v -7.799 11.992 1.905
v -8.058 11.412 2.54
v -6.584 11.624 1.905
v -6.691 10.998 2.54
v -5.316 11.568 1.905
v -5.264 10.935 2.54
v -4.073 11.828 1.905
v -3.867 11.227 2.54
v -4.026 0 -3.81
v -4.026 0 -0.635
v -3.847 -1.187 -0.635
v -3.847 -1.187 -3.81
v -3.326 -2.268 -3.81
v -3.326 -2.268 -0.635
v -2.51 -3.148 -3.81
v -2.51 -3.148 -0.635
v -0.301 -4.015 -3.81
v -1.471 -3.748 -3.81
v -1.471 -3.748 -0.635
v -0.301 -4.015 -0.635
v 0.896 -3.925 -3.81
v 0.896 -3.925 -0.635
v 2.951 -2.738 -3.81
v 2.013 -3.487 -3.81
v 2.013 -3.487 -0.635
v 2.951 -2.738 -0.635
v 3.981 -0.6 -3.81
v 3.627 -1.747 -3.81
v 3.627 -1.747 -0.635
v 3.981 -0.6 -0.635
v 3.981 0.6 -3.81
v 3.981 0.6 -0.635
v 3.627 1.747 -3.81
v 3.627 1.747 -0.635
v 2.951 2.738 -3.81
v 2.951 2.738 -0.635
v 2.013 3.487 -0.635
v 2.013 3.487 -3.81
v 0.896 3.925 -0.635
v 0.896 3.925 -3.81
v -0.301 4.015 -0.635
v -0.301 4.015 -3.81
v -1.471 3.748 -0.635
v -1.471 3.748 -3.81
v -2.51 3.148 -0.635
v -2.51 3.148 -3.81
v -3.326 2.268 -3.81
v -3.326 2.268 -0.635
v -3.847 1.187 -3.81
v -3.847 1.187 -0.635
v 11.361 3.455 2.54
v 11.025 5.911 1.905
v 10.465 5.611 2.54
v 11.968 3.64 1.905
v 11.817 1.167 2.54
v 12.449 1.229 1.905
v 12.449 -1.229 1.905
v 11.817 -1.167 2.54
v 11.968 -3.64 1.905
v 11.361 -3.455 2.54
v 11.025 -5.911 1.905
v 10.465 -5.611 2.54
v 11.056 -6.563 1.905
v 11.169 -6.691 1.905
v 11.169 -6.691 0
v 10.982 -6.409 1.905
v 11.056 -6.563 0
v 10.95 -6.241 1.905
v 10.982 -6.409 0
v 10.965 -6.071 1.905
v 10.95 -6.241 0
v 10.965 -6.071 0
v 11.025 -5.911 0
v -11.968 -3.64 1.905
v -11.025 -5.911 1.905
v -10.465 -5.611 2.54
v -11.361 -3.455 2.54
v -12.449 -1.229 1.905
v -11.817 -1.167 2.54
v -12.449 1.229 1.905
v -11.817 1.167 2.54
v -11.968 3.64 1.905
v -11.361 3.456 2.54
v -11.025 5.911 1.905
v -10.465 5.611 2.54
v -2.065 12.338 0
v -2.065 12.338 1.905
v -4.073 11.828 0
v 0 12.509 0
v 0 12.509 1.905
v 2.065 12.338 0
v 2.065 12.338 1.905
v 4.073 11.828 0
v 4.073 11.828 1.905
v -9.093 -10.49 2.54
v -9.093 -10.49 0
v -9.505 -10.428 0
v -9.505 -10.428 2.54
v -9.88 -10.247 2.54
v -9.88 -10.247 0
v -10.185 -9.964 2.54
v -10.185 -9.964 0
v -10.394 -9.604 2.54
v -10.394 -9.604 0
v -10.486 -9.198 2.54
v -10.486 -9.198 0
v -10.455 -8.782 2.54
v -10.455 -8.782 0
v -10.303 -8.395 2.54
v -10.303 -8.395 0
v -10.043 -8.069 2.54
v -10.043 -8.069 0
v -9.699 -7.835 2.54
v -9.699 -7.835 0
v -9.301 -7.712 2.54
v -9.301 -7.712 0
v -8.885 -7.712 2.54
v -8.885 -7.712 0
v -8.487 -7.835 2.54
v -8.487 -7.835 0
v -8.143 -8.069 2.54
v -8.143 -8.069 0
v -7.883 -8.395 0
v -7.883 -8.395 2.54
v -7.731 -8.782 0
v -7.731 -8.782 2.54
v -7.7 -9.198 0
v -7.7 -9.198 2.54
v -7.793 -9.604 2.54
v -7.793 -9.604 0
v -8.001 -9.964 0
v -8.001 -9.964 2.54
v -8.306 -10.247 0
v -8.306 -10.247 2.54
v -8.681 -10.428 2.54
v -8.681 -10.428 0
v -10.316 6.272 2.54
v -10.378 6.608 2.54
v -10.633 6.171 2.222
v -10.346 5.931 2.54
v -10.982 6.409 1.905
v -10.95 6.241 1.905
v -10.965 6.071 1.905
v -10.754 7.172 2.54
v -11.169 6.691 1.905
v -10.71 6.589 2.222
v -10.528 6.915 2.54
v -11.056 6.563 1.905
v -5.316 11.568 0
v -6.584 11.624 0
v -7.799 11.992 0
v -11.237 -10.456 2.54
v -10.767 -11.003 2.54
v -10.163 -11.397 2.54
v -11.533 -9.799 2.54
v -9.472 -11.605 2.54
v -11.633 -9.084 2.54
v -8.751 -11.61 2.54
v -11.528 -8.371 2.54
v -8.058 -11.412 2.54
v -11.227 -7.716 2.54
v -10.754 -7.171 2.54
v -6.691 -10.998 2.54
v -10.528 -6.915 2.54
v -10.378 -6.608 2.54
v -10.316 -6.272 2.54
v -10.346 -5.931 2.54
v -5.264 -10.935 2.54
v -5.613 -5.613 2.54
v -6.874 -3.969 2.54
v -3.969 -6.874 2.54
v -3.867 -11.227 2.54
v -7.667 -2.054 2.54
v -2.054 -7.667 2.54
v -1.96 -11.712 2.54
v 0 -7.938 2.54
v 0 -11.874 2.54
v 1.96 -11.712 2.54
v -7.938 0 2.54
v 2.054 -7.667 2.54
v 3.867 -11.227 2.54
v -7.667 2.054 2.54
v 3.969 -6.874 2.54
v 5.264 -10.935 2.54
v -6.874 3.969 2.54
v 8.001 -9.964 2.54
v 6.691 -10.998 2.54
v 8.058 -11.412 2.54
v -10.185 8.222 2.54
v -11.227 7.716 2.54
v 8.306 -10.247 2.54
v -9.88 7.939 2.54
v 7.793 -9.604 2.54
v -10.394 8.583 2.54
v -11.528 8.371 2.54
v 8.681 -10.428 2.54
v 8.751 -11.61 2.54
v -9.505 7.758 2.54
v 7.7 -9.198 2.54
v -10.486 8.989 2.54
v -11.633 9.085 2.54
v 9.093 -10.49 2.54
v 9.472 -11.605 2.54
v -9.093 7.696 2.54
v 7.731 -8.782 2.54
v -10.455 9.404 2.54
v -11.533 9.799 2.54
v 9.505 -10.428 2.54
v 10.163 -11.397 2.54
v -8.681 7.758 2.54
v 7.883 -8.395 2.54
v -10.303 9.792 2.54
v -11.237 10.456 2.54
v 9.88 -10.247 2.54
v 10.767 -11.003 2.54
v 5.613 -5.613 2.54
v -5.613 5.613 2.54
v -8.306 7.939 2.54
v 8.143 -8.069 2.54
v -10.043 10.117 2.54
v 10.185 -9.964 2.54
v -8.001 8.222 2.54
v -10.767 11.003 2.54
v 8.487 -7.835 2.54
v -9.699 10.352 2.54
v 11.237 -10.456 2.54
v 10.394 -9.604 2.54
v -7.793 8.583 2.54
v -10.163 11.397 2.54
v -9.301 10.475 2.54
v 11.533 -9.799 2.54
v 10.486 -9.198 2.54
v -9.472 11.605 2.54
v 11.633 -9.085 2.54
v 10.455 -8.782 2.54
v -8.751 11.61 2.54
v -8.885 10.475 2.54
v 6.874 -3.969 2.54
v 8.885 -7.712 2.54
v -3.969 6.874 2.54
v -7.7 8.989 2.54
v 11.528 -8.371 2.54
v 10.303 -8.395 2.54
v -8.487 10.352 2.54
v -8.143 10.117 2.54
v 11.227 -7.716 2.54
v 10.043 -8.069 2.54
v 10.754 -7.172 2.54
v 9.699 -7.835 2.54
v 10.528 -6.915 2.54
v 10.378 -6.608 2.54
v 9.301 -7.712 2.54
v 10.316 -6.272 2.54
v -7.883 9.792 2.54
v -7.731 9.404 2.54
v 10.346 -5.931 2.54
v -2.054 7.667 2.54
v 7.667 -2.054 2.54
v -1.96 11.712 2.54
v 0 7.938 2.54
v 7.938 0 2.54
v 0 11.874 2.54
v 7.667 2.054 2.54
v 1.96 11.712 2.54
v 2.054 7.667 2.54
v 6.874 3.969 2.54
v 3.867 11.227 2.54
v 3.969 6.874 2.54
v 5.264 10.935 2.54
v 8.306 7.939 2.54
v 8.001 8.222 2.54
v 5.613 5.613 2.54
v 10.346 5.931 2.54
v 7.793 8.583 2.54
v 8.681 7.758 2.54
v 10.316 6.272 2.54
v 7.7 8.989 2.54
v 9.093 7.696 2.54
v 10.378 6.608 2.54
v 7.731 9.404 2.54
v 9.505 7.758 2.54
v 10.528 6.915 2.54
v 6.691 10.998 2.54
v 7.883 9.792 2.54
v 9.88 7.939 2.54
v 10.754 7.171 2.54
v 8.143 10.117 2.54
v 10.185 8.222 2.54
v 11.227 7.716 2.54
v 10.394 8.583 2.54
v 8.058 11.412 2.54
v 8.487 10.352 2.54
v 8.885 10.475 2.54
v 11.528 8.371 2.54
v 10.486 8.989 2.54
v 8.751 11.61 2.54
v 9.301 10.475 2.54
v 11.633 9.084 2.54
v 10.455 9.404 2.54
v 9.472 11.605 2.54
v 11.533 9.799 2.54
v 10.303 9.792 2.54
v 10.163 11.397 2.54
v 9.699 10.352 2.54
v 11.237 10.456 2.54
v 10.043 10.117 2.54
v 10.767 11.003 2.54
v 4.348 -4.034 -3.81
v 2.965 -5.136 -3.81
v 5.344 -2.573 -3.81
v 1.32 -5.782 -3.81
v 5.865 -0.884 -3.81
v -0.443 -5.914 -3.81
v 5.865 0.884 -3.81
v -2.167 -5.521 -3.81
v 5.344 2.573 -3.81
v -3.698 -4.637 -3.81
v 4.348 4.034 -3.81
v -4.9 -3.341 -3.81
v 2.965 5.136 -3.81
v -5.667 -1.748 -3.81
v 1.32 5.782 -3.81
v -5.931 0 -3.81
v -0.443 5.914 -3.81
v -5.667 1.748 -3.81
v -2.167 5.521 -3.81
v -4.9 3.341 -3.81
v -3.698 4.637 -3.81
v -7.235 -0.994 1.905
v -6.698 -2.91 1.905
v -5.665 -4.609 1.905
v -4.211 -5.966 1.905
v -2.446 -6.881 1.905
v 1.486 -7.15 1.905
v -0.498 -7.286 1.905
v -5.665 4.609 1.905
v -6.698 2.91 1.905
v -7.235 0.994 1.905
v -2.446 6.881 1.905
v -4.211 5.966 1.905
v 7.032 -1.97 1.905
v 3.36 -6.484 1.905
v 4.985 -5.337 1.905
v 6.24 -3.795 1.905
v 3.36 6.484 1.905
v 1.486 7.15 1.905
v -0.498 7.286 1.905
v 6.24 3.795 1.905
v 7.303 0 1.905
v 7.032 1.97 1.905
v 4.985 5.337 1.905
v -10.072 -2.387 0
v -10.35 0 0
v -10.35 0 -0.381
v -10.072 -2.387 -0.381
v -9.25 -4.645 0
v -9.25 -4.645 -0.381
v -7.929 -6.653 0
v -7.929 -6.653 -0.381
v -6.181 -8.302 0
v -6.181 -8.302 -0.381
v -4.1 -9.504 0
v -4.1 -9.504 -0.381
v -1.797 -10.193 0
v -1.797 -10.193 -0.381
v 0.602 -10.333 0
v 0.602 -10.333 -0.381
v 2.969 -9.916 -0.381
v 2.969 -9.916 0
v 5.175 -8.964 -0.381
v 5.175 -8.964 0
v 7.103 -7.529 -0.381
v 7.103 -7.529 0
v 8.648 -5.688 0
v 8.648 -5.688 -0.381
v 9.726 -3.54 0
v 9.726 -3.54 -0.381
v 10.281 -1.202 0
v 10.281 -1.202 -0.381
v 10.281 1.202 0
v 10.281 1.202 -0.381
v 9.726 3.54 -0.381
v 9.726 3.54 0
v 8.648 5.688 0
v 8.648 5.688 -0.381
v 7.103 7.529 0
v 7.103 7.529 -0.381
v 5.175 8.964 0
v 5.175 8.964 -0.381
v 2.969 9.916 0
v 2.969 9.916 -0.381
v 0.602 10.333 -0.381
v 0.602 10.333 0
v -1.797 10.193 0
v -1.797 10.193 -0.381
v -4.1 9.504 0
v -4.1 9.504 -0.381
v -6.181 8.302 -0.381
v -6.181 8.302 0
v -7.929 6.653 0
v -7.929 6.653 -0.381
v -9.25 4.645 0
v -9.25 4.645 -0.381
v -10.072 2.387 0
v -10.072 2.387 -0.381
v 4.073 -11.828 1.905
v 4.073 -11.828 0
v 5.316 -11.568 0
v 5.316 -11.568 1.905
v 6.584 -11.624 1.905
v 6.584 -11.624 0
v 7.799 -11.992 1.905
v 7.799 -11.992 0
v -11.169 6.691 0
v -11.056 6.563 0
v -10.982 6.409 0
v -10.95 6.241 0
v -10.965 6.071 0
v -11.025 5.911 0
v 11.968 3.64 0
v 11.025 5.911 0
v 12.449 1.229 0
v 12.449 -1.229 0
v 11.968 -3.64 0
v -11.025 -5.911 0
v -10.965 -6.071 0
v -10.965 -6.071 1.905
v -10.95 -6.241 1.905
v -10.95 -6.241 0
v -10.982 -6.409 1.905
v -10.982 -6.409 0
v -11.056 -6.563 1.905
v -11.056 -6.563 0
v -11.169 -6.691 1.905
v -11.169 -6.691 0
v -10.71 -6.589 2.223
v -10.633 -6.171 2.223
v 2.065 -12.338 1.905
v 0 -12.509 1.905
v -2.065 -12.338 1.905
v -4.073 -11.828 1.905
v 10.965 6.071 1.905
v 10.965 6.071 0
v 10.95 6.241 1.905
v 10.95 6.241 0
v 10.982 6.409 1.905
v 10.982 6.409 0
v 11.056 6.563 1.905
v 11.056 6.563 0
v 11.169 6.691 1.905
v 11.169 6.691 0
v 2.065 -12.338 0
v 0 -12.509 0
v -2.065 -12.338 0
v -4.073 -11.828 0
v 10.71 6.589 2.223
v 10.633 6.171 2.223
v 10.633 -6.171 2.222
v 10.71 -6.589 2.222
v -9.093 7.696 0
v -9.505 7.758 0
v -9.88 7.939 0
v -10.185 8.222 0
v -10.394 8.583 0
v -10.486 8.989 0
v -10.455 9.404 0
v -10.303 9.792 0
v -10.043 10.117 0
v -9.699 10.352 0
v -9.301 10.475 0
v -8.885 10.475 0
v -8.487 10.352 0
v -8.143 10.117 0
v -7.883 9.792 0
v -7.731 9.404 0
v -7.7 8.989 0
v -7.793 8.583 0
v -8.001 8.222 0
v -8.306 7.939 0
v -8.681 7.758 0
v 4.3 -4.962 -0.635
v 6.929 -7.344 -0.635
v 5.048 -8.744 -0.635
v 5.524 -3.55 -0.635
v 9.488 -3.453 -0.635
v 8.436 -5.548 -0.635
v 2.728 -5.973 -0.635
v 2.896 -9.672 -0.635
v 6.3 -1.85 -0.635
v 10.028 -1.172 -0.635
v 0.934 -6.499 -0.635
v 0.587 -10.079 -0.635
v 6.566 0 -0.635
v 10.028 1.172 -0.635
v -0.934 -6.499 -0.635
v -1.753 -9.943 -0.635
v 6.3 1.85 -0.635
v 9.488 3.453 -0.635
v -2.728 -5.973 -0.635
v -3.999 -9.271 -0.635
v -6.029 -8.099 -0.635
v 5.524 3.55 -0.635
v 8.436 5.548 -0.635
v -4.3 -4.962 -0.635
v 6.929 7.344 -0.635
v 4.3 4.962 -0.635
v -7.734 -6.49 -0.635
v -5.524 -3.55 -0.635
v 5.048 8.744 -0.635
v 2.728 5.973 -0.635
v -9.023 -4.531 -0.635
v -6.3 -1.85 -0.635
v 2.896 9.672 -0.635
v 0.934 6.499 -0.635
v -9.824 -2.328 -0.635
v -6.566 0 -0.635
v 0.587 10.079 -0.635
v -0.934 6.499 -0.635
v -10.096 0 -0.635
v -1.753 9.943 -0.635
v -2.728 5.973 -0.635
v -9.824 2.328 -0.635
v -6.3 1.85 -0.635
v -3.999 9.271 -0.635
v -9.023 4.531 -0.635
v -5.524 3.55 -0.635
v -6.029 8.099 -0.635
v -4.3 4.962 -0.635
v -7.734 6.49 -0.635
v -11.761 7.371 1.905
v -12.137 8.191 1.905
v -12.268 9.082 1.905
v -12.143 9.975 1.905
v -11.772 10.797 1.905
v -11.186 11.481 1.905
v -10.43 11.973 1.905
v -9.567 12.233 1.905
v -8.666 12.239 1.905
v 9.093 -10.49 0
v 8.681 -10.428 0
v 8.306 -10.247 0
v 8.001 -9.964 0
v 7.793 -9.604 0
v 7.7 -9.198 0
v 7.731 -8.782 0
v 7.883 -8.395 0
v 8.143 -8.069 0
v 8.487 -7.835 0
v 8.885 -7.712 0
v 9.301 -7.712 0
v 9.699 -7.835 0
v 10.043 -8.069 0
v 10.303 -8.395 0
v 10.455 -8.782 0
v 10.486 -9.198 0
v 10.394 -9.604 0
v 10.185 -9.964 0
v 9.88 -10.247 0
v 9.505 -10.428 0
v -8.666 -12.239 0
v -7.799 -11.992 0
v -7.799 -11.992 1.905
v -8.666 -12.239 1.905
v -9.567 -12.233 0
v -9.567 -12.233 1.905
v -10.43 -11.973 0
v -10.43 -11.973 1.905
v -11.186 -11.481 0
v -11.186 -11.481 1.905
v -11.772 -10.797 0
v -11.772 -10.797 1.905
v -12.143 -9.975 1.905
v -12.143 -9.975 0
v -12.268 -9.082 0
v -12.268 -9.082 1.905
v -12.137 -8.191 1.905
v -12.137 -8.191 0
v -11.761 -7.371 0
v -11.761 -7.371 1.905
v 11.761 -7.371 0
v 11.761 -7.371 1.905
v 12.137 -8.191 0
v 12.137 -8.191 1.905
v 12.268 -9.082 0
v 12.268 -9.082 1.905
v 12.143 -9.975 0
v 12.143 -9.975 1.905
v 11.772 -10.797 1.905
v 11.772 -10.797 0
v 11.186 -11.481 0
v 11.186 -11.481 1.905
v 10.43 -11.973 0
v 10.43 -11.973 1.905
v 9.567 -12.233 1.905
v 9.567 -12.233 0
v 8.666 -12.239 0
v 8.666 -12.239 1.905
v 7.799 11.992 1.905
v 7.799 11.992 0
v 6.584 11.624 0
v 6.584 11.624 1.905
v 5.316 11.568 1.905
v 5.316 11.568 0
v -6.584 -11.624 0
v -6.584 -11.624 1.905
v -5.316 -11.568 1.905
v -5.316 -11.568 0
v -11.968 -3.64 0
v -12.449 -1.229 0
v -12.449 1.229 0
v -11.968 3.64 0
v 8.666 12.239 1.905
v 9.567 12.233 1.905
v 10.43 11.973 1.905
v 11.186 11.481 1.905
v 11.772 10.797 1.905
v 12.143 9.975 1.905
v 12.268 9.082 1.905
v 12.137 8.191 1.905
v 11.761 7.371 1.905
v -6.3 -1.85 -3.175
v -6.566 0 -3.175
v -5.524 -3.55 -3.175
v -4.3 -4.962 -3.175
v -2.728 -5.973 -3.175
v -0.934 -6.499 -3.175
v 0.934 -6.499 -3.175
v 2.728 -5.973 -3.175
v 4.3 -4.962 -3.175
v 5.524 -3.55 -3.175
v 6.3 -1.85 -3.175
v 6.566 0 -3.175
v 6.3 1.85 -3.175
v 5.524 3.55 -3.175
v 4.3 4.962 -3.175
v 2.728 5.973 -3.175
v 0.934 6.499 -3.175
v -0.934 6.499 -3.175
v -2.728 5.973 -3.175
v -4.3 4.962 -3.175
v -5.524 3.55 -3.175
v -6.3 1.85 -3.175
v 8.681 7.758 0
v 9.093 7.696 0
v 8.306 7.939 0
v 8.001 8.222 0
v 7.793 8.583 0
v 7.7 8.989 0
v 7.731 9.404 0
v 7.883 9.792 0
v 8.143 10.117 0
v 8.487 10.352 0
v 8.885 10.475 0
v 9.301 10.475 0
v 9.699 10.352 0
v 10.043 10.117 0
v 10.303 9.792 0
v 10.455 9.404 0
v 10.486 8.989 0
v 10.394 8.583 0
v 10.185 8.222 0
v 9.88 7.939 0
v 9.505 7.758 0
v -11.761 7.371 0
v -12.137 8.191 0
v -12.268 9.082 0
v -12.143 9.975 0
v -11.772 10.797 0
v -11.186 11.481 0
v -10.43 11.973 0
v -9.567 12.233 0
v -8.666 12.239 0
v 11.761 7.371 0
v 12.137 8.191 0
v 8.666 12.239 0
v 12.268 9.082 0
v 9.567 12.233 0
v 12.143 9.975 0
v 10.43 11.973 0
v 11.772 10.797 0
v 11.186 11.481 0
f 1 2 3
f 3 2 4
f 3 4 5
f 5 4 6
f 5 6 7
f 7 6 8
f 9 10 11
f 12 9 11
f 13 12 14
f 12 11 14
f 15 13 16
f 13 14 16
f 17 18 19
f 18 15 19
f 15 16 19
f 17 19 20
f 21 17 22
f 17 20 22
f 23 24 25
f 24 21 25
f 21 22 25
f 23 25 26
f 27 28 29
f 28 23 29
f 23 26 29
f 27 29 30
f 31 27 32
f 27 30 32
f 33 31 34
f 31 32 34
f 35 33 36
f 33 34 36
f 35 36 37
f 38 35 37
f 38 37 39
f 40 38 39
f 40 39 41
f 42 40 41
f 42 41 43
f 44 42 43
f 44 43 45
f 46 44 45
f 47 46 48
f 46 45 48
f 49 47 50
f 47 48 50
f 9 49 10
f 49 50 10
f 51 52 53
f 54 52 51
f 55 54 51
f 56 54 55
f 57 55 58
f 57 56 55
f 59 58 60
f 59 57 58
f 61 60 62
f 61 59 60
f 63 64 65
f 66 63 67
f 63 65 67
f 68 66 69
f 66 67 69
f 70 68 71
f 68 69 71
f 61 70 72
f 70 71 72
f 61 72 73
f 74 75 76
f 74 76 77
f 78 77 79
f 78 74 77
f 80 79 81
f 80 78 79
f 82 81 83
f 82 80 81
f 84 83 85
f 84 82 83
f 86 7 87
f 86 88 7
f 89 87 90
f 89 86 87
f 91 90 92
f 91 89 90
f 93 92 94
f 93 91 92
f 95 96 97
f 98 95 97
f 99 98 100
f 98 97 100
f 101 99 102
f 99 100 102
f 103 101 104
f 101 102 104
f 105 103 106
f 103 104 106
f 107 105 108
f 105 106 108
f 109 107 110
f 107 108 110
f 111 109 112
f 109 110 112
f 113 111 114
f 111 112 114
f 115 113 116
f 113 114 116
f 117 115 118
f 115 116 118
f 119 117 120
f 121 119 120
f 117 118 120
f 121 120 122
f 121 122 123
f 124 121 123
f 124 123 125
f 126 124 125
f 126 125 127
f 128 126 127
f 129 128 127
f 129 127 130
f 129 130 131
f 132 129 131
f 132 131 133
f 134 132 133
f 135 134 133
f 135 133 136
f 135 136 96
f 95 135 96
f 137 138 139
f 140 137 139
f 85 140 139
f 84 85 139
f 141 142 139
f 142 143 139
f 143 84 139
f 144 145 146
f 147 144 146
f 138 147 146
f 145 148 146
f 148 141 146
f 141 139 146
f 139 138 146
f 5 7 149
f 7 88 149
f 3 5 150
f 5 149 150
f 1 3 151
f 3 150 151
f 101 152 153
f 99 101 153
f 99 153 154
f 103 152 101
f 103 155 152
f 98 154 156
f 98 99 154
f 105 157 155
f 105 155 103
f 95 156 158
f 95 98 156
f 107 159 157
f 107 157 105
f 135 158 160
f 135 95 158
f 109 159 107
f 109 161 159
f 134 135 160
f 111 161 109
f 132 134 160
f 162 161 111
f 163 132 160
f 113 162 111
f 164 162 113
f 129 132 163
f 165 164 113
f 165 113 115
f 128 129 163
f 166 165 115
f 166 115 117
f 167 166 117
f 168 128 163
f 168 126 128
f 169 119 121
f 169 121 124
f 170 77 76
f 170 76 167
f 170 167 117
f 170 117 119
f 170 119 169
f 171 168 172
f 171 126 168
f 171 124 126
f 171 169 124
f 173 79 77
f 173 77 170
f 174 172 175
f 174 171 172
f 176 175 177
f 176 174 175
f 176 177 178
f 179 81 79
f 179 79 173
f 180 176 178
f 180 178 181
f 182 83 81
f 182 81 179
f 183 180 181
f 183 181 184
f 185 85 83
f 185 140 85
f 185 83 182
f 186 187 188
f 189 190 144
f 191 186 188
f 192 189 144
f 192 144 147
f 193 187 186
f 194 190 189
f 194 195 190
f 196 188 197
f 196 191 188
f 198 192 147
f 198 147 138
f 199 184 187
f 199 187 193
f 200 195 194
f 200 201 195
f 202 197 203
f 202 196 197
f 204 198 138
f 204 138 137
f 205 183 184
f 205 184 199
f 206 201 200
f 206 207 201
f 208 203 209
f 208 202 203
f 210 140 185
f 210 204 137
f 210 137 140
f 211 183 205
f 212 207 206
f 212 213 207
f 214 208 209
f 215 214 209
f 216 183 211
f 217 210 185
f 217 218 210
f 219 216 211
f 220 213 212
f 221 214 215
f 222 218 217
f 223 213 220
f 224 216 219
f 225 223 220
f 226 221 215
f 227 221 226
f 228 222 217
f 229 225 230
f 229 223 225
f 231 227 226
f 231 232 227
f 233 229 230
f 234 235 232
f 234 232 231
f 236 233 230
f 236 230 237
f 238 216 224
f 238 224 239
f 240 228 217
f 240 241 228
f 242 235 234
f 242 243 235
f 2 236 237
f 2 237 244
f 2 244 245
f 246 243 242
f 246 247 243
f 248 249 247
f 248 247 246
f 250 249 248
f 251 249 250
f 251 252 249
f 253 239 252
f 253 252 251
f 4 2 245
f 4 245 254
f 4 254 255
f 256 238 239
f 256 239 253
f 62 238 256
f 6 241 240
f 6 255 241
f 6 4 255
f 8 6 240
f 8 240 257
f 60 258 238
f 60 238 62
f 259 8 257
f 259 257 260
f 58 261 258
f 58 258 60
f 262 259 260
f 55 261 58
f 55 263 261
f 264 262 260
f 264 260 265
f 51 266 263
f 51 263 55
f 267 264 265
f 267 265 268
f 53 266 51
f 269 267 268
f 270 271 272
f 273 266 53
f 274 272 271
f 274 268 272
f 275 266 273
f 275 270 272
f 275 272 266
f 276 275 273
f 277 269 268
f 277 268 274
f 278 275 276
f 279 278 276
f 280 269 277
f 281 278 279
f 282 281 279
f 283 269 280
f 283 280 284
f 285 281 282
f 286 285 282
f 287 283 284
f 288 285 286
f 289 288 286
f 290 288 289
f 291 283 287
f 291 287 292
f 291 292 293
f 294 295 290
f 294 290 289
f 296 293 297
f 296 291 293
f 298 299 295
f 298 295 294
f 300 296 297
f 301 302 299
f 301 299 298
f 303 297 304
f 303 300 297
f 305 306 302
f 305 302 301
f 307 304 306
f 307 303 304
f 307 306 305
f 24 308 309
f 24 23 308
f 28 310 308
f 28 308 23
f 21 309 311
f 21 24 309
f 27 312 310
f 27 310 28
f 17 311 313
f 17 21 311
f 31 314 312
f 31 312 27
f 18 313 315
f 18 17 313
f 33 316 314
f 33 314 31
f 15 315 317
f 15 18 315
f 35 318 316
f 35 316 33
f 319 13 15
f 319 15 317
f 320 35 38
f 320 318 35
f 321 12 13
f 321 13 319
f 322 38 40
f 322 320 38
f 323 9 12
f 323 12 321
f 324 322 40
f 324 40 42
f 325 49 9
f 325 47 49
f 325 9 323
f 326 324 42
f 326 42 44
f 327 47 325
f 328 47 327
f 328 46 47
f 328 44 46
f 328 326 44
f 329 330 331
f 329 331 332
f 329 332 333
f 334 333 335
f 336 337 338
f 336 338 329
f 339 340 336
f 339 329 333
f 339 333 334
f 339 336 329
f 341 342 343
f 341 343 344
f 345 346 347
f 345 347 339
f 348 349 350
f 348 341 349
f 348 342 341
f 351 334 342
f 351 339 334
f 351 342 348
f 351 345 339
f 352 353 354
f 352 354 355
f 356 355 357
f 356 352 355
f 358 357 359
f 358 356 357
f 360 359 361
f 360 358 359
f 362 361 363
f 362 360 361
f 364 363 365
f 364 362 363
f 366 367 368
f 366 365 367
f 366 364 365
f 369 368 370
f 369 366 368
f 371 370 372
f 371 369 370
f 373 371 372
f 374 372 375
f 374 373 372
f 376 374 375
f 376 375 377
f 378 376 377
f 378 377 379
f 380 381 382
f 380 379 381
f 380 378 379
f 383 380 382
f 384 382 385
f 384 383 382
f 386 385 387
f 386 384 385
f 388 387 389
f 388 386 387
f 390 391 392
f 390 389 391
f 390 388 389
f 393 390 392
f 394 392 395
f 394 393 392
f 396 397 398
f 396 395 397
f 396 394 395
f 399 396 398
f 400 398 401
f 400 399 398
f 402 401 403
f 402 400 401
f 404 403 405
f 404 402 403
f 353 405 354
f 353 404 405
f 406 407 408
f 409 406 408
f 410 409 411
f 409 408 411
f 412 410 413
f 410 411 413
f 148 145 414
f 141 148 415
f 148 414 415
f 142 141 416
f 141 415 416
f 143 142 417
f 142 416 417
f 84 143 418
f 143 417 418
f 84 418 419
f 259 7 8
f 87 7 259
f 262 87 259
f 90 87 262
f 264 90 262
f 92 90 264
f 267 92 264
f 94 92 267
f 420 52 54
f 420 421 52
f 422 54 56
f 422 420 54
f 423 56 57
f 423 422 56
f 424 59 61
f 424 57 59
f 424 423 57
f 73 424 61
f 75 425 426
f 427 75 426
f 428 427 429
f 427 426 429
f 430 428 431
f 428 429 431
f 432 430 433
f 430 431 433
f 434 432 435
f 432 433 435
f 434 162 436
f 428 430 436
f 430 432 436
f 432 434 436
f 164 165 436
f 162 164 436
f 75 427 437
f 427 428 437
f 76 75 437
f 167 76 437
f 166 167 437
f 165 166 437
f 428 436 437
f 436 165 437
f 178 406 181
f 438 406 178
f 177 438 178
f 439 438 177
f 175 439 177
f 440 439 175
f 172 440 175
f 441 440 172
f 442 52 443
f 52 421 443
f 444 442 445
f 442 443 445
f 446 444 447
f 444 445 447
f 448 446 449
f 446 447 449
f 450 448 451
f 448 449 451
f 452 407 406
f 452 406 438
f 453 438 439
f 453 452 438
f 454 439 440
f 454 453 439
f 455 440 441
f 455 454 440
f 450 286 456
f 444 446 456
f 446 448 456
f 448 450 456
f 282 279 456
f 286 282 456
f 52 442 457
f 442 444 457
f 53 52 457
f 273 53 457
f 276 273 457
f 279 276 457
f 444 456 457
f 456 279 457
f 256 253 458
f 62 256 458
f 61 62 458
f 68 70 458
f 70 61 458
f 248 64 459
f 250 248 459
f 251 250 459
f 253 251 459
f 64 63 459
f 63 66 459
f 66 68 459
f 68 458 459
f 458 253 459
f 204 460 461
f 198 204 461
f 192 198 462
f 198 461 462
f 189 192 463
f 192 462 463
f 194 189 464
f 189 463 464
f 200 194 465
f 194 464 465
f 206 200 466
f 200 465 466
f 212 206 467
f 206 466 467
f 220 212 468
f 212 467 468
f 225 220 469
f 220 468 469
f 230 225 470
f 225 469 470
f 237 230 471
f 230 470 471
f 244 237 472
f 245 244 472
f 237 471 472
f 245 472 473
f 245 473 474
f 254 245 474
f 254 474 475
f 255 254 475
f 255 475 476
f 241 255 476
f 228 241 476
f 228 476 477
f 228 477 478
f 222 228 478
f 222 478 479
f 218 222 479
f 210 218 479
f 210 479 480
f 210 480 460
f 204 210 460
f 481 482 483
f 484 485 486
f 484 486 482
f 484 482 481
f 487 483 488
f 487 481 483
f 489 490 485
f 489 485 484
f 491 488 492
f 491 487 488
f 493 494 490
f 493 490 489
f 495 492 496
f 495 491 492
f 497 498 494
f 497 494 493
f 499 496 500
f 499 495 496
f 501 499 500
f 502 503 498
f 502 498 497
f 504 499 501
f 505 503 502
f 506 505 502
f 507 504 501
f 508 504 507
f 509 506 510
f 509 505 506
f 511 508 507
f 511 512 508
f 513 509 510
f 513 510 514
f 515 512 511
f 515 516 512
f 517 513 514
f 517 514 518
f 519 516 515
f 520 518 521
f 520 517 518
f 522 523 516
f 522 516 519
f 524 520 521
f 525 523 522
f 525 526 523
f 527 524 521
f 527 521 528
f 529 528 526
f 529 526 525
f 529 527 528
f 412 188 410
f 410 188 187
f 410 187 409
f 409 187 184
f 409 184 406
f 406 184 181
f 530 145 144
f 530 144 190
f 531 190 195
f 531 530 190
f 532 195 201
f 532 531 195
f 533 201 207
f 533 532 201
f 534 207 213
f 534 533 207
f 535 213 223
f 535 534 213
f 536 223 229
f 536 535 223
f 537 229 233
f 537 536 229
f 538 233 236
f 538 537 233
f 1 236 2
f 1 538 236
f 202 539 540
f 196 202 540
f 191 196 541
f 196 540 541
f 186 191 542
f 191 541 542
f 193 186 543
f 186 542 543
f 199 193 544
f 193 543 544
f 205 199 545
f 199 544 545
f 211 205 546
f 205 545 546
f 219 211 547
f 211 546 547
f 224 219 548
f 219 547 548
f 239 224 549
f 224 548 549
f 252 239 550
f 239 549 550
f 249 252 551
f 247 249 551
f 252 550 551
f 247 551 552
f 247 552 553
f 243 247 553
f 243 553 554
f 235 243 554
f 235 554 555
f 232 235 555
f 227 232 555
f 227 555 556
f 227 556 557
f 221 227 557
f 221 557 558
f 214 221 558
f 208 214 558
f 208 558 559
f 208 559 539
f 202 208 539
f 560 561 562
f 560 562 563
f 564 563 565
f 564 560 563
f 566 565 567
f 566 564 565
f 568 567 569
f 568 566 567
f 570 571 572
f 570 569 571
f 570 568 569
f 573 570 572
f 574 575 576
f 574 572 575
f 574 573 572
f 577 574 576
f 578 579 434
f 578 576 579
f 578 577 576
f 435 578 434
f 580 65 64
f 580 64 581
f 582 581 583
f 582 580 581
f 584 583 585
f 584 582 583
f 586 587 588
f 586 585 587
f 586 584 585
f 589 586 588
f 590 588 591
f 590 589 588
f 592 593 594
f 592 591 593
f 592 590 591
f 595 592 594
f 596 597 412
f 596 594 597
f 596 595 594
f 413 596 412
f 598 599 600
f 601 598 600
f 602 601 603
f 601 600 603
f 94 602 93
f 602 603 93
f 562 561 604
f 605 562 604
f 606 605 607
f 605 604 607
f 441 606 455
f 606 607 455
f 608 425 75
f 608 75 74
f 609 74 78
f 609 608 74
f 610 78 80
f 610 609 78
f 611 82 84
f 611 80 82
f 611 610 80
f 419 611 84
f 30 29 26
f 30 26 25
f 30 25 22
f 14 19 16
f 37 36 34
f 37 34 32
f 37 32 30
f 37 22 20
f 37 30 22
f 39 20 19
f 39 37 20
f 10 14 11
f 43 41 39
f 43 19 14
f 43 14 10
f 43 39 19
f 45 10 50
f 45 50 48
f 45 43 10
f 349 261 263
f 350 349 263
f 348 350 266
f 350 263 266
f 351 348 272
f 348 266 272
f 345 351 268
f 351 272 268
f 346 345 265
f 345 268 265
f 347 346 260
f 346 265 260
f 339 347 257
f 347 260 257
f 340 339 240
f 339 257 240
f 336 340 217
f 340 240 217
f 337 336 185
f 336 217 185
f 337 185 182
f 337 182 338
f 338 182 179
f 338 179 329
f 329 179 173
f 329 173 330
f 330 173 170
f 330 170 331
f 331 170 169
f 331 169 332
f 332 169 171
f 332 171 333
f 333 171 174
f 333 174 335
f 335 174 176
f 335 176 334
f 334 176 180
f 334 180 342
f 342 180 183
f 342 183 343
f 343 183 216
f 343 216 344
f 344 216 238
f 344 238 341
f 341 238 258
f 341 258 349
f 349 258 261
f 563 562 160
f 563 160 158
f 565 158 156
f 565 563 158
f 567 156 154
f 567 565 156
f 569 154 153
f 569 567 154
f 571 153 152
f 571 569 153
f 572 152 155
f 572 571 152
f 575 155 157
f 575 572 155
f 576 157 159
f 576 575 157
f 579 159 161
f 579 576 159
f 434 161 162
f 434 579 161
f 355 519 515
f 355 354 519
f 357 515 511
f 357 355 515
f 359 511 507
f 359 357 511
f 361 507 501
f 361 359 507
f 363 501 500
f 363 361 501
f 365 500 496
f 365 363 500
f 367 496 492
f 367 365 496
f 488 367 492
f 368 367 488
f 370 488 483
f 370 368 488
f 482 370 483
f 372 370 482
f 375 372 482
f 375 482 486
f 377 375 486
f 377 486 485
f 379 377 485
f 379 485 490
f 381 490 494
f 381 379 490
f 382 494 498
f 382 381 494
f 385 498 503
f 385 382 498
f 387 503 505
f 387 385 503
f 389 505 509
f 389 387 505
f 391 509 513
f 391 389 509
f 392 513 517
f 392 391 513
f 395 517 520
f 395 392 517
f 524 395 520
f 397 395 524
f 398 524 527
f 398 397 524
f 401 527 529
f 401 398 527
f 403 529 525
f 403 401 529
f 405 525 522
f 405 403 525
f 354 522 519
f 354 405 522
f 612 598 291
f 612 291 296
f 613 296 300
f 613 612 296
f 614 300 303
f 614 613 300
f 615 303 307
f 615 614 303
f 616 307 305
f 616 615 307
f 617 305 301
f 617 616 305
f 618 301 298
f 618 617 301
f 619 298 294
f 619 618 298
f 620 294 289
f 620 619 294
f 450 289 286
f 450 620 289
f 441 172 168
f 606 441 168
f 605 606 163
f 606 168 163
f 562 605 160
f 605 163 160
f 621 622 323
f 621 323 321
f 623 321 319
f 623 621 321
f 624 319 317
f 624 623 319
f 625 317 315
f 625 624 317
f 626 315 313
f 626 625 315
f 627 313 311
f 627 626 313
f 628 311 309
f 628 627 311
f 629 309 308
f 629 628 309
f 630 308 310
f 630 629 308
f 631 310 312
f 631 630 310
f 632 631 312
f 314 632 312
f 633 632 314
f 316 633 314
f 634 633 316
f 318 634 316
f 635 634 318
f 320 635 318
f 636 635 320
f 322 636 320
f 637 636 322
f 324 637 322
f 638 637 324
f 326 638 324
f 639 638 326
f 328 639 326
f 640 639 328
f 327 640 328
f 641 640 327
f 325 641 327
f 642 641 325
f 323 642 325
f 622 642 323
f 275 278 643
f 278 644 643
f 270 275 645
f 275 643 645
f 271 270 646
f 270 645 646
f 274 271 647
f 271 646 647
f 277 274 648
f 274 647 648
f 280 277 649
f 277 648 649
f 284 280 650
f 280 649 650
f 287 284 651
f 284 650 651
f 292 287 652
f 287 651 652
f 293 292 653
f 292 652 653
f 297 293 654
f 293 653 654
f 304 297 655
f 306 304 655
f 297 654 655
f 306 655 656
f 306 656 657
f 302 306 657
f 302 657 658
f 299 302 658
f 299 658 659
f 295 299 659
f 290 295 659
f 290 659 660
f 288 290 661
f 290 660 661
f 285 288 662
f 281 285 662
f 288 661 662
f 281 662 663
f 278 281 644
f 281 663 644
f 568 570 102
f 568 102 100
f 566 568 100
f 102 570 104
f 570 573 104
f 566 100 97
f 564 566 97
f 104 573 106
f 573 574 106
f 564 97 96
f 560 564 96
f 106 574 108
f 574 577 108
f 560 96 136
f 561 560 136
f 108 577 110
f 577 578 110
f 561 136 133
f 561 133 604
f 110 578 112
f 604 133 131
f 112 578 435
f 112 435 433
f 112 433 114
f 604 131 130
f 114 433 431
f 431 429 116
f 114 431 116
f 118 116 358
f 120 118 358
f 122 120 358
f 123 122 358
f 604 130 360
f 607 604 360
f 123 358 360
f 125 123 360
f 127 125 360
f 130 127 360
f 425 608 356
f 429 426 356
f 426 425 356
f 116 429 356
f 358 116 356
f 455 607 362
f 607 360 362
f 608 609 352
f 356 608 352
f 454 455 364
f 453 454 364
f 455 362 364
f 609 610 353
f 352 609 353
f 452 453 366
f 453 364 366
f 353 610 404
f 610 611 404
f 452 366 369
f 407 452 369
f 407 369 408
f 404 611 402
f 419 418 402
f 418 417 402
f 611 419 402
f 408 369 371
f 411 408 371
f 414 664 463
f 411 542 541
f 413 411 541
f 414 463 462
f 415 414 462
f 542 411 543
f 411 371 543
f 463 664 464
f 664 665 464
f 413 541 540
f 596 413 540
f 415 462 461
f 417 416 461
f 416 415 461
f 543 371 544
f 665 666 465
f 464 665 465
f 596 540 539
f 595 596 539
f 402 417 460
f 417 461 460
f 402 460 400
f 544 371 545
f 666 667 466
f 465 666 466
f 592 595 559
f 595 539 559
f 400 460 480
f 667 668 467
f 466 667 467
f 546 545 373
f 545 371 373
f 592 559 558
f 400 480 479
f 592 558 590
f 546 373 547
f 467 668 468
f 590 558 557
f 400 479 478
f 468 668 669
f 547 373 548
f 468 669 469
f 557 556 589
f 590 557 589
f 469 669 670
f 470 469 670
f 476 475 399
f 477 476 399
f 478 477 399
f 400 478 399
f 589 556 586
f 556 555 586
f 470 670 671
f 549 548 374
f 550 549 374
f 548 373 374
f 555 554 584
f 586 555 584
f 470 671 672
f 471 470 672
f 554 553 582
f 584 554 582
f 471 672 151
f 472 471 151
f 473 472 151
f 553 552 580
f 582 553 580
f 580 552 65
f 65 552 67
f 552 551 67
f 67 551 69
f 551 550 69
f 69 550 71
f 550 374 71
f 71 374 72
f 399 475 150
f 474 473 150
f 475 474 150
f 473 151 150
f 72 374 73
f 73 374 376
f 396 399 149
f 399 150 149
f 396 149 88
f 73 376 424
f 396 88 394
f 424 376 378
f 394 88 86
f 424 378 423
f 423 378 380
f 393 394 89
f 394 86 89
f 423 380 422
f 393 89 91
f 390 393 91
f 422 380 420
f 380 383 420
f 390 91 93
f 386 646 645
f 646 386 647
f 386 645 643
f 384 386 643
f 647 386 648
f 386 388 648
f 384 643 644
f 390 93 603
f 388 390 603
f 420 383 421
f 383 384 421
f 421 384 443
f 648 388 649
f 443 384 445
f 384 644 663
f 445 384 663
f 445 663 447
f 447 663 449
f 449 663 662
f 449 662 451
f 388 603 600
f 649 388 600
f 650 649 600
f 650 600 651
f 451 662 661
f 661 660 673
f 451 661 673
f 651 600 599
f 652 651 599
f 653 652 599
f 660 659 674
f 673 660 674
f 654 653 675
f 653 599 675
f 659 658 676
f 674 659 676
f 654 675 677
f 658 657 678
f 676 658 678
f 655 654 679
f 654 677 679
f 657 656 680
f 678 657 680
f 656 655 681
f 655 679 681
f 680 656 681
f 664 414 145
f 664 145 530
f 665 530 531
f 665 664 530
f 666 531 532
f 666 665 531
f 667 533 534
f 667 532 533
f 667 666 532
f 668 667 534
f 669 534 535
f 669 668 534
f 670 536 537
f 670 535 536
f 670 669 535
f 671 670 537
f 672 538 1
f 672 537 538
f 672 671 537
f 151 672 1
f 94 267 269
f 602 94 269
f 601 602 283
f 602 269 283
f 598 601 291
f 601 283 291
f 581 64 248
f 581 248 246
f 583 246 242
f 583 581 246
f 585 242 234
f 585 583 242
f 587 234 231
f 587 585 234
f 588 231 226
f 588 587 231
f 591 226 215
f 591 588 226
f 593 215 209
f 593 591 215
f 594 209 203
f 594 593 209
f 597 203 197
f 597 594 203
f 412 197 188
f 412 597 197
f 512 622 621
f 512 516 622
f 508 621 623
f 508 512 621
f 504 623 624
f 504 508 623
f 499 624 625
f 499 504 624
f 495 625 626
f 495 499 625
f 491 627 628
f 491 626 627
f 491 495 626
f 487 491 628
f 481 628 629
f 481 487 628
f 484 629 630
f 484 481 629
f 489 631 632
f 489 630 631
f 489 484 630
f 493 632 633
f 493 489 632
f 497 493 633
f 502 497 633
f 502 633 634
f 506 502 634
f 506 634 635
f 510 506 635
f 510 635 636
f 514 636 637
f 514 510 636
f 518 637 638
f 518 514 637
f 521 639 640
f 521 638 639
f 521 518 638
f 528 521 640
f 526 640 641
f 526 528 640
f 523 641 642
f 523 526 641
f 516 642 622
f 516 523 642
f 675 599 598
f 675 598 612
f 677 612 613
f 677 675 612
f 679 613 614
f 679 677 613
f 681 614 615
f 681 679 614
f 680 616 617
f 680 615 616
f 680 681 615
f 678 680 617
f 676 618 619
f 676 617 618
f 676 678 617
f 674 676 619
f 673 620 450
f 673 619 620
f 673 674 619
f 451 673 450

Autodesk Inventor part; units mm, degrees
ref_plane "YZ Plane" through (0, 0, 0) normal (1, 0, 0) x (0, 1, 0)
ref_plane "XZ Plane" through (0, 0, 0) normal (0, 1, 0) x (-1, 0, 0)
ref_plane "XY Plane" through (0, 0, 0) normal (0, 0, 1) x (1, 0, 0)
sketch "Sketch1" plane through (0, 0, 0) normal (0, 0, 1) x (1, 0, 0)
  circle A0 centre (0, 0) radius 10.4775 projected
  circle A1 centre (9.0932, -9.0932) radius 0.9652 projected
  circle A2 centre (-9.0932, 9.0932) radius 0.9652 projected
  circle A3 centre (9.0932, 9.0932) radius 0.9652 projected
  circle A4 centre (-9.0932, -9.0932) radius 0.9652 projected
  arc A5 (11.1694, 6.6911) -> (7.7987, 11.9923) centre (9.0932, 9.0932) ccw projected
  arc A6 (4.0733, 11.8277) -> (7.7987, 11.9923) centre (5.7275, 16.6309) ccw projected
  arc A7 (4.0733, 11.8277) -> (-4.0733, 11.8277) centre (0, 0) ccw projected
  arc A8 (-7.7987, 11.9923) -> (-4.0733, 11.8277) centre (-5.7275, 16.6309) ccw projected
  arc A9 (-7.7987, 11.9923) -> (-11.1694, 6.6911) centre (-9.0932, 9.0932) ccw projected
  arc A10 (-11.025, 5.9107) -> (-11.1694, 6.6911) centre (-11.5847, 6.2107) ccw projected
  arc A11 (-11.025, 5.9107) -> (-11.025, -5.9107) centre (0, 0) ccw projected
  arc A12 (-11.1694, -6.6911) -> (-11.025, -5.9107) centre (-11.5847, -6.2107) ccw projected
  arc A13 (-11.1694, -6.6911) -> (-7.7987, -11.9923) centre (-9.0932, -9.0932) ccw projected
  arc A14 (-4.0733, -11.8277) -> (-7.7987, -11.9923) centre (-5.7275, -16.6309) ccw projected
  arc A15 (-4.0733, -11.8277) -> (4.0733, -11.8277) centre (0, 0) ccw projected
  arc A16 (7.7987, -11.9923) -> (4.0733, -11.8277) centre (5.7275, -16.6309) ccw projected
  arc A17 (7.7987, -11.9923) -> (11.1694, -6.6911) centre (9.0932, -9.0932) ccw projected
  arc A18 (11.025, -5.9107) -> (11.1694, -6.6911) centre (11.5847, -6.2107) ccw projected
  arc A19 (11.025, -5.9107) -> (11.025, 5.9107) centre (0, 0) ccw projected
  arc A20 (11.1694, 6.6911) -> (11.025, 5.9107) centre (11.5847, 6.2107) ccw projected
  point P0 (0, 0)
extrude "Extrusion1" add sketch "Sketch1" along normal blind 2.54 contours A0 | A1 | A2 | A3 | A4 | A20 A19 A18 A17 A16 A15 A14 A13 A12 A11 A10 A9 A8 A7 A6 A5
sketch "Sketch2" plane through (0, 0, 0) normal (0, 0, -1) x (-1, 0, 0)
  circle A0 centre (0, 0) radius 10.4775 projected
  circle A1 centre (0, 0) radius 10.3505
  dimension "d2" = 0.127
extrude "Extrusion2" add sketch "Sketch2" along normal blind 0.635 contours A1
sketch "Sketch3" plane through (0, 0, -0.635) normal (0, 0, -1) x (-1, 0, 0)
  circle A0 centre (0, 0) radius 4.0005 projected
  circle A1 centre (0, 0) radius 4.0259
  circle A2 centre (0, 0) radius 6.5659
  dimension "d5" = 0.0254
  dimension "d6" = 2.54
extrude "Extrusion3" add sketch "Sketch3" along normal blind 3.175 contours A2
chamfer "Chamfer1" distance 0.635 angle 45 1 edges at (6.5659, 0, -3.81)
chamfer "Chamfer4" distance 0.254 angle 45 1 edges at (10.3505, 0, -0.635)
sketch "Sketch4" plane through (0, 0, 2.54) normal (0, 0, 1) x (1, 0, 0)
  arc A0 (11.1694, 6.6911) -> (7.7987, 11.9923) centre (9.0932, 9.0932) ccw projected
  arc A1 (-7.7987, 11.9923) -> (-11.1694, 6.6911) centre (-9.0932, 9.0932) ccw projected
  arc A2 (-11.1694, -6.6911) -> (-7.7987, -11.9923) centre (-9.0932, -9.0932) ccw projected
  arc A3 (7.7987, -11.9923) -> (11.1694, -6.6911) centre (9.0932, -9.0932) ccw projected
hole "Hole1" at (9.0932, 9.0932, 2.54) at (-9.0932, 9.0932, 2.54) at (-9.0932, -9.0932, 2.54) at (9.0932, -9.0932, 2.54) direction (0, 0, -1) diameter 2.794 end through all clearance for "Flat Head Machine Screw (82)" size "#3" standard "Ansi Unified Screw Threads"
sketch "Sketch5" plane through (0, 0, 2.54) normal (0, 0, 1) x (1, 0, 0)
  arc A0 (11.025, -5.9107) -> (11.025, 5.9107) centre (0, 0) ccw projected
  circle A1 centre (0, 0) radius 7.9375
  dimension "d19" = 15.875
extrude "Extrusion4" cut sketch "Sketch5" against normal blind 0.635
chamfer "Chamfer2" distance 0.635 angle 45 1 edges at (-7.9375, 0, 1.905)
chamfer "Chamfer3" distance 0.635 angle 45 16 edges at (12.5095, 0, 2.54) (10.9603, 6.3263, 2.54) (11.7724, 10.7968, 2.54) (5.9517, 11.5558, 2.54) (0, 12.5095, 2.54) (-5.9517, 11.5558, 2.54) (-11.7724, 10.7968, 2.54) (-10.9603, 6.3263, 2.54) (-12.5095, 0, 2.54) (-10.9603, -6.3263, 2.54) (-11.7724, -10.7968, 2.54) (-5.9517, -11.5558, 2.54) (0, -12.5095, 2.54) (5.9517, -11.5558, 2.54) (11.7724, -10.7968, 2.54) (10.9603, -6.3263, 2.54)
properties part number "Crankshaft Cover"
